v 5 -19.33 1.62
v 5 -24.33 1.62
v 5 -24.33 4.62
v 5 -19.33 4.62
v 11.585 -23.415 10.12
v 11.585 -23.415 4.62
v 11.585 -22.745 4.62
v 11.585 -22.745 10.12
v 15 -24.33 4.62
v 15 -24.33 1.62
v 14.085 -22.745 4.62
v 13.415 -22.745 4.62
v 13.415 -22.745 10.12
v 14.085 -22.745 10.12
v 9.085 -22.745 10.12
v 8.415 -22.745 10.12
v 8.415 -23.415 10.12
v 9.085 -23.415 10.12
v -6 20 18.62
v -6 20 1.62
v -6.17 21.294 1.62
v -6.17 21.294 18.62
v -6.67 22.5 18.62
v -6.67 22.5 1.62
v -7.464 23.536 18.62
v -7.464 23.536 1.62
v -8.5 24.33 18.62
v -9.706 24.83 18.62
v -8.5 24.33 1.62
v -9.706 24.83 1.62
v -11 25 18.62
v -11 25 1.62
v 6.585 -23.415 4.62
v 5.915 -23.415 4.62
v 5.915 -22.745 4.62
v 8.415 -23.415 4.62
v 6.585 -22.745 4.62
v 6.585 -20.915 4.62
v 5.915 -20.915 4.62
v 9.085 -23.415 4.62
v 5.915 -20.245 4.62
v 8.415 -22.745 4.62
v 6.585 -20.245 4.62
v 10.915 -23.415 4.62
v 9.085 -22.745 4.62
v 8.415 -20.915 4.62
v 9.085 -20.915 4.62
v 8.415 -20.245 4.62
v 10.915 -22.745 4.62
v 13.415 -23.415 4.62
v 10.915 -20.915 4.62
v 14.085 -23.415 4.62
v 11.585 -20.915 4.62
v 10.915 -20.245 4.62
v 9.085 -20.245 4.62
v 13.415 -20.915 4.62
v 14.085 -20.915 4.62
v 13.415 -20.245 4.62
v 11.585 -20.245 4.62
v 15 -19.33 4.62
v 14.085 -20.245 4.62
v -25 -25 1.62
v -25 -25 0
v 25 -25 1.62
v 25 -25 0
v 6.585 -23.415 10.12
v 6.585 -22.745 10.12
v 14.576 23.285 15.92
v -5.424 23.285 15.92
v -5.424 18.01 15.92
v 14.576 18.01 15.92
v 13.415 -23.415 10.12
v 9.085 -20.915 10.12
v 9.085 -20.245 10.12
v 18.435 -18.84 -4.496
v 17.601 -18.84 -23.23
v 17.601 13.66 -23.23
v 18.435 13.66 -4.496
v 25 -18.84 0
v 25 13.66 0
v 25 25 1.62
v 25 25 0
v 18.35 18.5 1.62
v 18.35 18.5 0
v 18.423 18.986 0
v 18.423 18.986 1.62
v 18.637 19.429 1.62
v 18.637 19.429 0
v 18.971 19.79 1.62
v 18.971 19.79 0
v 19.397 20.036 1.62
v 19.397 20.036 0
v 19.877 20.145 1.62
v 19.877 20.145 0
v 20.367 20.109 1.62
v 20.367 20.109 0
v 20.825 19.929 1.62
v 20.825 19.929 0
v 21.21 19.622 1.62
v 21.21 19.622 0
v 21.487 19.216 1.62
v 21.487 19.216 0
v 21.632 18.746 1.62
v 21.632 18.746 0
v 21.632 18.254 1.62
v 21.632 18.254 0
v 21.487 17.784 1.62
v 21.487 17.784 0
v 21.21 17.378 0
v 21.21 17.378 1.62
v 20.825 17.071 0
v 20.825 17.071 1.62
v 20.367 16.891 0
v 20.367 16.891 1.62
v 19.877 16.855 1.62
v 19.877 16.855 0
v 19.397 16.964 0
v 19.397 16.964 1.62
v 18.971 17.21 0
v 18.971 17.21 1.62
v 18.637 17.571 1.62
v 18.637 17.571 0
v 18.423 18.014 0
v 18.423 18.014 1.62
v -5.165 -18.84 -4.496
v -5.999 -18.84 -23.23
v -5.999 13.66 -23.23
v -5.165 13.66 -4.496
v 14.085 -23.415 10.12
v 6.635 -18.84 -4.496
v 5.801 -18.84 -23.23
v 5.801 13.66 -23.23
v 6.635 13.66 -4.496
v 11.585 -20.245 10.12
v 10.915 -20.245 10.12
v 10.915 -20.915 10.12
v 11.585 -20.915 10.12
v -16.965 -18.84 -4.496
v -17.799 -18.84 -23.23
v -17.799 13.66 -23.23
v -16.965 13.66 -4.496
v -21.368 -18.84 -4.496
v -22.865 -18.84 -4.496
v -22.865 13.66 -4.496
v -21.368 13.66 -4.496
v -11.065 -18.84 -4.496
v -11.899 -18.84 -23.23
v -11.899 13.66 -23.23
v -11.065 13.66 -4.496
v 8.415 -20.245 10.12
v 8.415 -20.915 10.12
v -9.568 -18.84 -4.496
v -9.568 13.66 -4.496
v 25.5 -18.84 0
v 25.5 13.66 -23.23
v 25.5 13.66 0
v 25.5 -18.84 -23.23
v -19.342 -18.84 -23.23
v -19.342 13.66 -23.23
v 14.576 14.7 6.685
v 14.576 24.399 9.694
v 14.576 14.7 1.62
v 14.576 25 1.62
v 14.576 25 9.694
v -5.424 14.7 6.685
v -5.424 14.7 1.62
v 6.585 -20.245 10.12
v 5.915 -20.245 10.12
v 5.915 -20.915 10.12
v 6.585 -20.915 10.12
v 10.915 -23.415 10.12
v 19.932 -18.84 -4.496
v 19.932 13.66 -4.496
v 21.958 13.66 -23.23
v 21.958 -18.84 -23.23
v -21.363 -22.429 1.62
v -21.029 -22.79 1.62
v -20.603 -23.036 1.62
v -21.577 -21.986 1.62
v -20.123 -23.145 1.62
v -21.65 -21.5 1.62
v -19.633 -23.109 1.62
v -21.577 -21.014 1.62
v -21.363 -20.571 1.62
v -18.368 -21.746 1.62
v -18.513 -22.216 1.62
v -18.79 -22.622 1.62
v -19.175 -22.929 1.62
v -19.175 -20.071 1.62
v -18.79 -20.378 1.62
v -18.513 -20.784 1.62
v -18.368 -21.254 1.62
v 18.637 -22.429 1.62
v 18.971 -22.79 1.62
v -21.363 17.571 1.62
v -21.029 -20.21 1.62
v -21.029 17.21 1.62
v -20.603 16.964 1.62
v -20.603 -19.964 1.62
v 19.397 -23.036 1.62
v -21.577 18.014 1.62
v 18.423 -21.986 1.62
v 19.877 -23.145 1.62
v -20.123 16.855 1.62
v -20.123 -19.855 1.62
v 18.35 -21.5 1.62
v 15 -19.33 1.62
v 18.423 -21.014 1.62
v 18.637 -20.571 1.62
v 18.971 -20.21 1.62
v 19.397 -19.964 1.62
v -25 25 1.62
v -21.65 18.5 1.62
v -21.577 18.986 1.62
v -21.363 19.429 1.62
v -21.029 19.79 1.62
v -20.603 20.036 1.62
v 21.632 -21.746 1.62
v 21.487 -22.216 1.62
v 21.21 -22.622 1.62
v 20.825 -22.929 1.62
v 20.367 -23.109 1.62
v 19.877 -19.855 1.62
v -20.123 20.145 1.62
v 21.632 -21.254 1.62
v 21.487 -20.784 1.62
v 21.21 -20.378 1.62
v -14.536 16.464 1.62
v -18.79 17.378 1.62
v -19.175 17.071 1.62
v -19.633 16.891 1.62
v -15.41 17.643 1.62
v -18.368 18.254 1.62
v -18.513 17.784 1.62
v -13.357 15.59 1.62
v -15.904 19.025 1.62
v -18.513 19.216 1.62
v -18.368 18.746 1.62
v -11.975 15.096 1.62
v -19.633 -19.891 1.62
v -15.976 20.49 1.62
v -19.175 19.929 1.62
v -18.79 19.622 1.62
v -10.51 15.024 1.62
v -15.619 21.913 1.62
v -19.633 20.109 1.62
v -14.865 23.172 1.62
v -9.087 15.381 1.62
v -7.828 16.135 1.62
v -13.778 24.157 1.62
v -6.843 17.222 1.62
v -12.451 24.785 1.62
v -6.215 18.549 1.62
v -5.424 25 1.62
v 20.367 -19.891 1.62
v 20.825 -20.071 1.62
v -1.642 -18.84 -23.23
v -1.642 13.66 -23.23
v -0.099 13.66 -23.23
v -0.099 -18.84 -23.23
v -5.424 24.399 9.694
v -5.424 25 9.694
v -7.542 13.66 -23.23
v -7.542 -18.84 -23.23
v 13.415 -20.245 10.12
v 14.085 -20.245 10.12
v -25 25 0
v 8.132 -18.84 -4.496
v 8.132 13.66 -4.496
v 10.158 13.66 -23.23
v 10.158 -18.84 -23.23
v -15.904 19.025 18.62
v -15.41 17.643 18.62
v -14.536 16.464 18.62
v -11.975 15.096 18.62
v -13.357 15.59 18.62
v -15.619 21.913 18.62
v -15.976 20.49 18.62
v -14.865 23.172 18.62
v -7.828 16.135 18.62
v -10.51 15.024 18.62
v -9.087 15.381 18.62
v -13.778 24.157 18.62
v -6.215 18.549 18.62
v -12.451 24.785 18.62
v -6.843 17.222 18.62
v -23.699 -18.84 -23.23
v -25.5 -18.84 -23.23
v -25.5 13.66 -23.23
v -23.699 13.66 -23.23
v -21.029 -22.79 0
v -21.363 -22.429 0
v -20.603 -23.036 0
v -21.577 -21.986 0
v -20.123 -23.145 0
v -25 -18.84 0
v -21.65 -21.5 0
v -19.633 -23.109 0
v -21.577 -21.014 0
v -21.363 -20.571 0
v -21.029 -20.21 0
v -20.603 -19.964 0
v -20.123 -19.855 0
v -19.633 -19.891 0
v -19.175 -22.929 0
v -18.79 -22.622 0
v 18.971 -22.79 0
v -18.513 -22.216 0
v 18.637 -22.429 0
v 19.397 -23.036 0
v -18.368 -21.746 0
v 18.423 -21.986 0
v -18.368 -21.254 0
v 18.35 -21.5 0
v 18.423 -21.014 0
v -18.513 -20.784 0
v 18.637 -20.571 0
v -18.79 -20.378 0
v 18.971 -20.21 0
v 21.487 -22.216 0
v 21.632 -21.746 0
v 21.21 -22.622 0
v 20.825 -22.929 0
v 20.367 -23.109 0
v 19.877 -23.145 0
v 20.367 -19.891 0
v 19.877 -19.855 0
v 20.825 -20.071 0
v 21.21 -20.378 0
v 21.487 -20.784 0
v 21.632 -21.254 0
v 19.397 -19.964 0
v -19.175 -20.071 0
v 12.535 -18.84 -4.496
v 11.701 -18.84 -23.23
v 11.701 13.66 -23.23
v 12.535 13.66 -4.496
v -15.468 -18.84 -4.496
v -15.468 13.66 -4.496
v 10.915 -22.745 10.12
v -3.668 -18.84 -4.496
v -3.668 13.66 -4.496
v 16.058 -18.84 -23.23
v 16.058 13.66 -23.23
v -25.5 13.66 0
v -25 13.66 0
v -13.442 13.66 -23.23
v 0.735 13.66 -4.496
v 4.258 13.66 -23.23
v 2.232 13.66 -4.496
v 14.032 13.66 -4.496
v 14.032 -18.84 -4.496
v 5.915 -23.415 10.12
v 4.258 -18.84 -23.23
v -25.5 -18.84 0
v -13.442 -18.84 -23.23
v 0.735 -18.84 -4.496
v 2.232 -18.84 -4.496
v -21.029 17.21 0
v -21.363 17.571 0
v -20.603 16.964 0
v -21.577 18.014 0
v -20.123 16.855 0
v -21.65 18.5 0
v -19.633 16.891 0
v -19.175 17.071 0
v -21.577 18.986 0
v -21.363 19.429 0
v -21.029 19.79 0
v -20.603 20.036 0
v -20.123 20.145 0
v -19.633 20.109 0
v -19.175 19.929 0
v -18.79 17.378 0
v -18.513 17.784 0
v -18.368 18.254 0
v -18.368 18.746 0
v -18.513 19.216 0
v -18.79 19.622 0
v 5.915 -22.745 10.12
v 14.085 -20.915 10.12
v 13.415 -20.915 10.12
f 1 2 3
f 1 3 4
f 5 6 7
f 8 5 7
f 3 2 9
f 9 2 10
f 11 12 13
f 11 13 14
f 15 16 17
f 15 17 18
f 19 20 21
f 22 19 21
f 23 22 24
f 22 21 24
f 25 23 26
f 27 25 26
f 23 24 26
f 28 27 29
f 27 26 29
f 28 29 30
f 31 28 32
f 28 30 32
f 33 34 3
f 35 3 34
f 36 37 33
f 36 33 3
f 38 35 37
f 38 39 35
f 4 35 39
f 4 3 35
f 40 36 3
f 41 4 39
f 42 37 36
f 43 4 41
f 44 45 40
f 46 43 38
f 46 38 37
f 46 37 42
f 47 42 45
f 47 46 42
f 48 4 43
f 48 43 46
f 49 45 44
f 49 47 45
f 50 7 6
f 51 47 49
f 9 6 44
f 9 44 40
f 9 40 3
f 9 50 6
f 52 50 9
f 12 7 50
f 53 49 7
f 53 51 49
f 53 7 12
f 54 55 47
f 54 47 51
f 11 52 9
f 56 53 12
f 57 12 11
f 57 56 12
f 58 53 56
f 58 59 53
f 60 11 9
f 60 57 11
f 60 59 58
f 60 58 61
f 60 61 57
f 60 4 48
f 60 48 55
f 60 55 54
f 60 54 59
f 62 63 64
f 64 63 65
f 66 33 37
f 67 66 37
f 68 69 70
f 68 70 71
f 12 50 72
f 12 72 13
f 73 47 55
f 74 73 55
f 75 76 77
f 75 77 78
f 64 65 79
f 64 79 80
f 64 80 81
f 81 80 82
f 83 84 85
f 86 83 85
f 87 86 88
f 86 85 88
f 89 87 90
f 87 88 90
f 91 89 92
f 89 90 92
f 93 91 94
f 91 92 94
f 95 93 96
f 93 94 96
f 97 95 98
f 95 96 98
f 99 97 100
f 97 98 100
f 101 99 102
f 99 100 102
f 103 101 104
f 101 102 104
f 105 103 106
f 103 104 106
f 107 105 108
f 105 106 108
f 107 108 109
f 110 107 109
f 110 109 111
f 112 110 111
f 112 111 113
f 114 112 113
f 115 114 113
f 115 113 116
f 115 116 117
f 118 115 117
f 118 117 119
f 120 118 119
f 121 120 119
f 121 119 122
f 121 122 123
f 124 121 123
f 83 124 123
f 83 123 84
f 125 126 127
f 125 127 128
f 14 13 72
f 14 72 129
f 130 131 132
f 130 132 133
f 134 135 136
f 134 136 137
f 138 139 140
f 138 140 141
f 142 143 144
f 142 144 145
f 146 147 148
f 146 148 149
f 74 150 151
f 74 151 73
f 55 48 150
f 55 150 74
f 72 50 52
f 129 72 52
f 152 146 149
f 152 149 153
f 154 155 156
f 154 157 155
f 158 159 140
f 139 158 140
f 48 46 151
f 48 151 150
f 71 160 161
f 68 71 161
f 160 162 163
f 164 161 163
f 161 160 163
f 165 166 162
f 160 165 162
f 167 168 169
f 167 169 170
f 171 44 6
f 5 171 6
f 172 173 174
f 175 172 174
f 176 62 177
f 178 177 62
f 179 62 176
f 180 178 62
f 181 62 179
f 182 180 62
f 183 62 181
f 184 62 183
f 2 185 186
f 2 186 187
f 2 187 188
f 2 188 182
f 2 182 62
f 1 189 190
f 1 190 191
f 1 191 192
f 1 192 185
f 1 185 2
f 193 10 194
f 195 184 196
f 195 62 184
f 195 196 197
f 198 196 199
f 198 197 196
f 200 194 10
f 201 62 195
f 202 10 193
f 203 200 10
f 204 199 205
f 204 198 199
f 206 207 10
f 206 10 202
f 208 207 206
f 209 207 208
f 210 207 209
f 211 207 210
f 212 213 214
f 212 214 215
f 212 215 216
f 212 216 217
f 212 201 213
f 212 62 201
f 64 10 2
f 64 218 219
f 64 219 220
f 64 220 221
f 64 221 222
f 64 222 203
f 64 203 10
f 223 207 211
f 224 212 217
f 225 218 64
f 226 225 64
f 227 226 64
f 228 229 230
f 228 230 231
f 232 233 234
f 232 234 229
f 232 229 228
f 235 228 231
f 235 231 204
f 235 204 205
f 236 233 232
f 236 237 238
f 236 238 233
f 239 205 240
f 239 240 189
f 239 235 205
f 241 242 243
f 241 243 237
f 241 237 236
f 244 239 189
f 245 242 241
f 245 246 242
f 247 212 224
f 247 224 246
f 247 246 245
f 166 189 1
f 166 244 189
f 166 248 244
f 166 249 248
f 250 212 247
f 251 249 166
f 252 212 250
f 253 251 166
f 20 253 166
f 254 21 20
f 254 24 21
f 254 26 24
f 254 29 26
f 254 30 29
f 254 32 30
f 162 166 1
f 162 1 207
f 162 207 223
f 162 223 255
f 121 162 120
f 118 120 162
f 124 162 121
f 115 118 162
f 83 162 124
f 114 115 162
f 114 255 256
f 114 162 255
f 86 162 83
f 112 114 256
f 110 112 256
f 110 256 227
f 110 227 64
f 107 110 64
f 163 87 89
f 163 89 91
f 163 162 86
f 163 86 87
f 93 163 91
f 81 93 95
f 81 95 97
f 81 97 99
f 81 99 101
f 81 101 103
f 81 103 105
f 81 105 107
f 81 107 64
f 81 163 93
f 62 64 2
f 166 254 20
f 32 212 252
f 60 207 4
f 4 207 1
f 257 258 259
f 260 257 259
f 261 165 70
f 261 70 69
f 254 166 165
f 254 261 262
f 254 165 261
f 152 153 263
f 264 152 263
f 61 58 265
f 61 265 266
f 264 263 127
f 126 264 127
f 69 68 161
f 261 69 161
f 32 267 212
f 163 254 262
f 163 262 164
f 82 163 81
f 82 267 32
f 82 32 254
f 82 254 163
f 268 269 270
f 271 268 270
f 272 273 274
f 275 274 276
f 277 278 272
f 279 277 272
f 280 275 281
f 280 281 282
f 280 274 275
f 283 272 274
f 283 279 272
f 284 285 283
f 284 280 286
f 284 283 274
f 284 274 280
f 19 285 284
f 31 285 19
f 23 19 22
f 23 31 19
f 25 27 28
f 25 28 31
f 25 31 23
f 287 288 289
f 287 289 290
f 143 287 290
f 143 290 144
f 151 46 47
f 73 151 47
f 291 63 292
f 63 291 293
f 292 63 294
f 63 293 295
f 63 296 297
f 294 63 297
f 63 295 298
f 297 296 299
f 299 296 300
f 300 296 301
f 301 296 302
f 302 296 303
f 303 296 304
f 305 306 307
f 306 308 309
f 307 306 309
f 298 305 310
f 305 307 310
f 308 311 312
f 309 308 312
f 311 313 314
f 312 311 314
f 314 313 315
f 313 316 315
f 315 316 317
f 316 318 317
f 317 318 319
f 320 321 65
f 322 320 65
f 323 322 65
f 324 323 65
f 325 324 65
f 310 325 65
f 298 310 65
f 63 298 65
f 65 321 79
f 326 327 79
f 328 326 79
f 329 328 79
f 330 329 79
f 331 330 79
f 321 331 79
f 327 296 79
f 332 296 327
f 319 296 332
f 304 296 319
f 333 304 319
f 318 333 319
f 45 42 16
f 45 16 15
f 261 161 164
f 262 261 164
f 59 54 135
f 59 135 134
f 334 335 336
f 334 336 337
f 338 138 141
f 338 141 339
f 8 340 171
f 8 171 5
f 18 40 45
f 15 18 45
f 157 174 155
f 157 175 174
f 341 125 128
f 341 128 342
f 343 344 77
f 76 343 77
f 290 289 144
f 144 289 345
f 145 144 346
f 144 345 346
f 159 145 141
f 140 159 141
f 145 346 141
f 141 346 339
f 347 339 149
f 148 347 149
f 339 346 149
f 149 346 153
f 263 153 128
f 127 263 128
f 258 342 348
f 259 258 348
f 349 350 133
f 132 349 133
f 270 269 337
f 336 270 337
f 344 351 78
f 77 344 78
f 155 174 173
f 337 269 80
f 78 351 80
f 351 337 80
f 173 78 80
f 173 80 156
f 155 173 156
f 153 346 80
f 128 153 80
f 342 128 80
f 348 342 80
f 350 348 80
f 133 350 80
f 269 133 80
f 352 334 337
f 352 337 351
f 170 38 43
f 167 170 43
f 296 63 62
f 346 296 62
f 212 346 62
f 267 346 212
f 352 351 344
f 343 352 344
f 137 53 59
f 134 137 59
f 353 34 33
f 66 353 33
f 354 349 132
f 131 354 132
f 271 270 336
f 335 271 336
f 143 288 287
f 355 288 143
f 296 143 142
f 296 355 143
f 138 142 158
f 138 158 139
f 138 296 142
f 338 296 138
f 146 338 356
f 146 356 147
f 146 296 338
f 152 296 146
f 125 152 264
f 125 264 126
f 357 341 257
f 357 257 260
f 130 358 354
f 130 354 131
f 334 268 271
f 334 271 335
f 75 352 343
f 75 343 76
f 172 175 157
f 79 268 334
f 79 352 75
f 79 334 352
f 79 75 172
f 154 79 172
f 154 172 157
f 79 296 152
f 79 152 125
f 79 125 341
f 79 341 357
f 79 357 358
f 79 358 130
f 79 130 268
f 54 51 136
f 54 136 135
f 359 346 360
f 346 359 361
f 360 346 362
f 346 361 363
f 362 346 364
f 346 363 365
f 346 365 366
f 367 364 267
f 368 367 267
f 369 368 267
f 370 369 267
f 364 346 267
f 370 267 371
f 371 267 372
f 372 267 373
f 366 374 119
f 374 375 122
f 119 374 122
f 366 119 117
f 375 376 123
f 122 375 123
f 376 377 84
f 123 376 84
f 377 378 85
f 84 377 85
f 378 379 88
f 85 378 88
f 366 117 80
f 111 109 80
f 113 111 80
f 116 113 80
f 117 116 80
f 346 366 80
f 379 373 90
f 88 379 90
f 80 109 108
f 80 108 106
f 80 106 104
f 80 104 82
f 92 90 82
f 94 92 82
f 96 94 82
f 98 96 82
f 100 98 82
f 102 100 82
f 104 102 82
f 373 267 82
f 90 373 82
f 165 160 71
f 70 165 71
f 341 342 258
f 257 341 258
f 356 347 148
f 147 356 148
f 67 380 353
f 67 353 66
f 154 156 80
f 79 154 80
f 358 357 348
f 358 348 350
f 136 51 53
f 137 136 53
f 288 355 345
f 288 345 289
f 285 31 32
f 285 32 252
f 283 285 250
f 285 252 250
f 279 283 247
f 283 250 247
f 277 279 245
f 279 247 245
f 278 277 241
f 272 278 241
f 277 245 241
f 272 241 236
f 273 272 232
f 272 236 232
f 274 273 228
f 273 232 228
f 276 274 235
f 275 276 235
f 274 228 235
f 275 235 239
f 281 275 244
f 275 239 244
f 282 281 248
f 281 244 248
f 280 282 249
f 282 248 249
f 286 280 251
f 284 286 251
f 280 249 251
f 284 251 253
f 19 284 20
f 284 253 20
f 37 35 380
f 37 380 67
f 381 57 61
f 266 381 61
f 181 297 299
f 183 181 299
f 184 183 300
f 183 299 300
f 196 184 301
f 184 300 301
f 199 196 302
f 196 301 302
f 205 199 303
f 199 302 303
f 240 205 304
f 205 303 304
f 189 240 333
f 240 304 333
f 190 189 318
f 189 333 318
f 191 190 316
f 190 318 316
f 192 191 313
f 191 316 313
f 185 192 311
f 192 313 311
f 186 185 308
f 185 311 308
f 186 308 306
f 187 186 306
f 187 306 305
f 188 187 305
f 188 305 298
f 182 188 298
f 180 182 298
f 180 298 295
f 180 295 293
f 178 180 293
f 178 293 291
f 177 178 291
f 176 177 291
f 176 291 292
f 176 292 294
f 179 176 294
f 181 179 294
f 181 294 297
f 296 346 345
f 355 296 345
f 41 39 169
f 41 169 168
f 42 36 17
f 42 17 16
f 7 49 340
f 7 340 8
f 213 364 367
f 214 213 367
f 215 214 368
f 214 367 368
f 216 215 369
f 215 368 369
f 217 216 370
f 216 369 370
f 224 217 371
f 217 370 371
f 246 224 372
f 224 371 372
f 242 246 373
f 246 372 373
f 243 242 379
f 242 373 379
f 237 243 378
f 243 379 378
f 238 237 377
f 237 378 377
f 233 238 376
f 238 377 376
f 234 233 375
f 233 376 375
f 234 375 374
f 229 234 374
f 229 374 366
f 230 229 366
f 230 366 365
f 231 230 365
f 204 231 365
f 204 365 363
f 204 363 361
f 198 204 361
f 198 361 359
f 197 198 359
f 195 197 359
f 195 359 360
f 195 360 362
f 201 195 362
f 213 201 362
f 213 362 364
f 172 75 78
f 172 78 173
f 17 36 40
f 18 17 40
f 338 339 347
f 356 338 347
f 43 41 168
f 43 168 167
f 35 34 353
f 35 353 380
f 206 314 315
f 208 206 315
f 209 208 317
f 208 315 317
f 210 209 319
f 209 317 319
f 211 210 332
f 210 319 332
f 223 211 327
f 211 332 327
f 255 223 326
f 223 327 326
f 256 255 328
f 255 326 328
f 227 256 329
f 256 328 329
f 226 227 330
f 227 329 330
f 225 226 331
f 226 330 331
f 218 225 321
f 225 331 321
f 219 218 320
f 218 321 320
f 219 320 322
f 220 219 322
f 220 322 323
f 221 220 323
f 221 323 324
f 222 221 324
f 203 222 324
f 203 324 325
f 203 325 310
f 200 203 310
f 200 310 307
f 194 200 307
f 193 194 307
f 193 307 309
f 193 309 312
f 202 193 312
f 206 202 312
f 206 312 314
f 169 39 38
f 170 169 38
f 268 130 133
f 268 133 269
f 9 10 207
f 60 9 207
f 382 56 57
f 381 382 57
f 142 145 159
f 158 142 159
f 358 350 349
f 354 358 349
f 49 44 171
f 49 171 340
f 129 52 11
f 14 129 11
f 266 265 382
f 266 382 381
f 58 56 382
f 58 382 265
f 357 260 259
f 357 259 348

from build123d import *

# Parameters (mm, degrees)
F0_W          = 50
F0_H          = 50
F1_DEPTH      = 1.62
F3_DEPTH      = 17
F2_W          = 20
F2_H          = 10.3
F4_DEPTH      = 14.3
F2_W_2        = 2.5
F2_H_2        = 5
F2_W_3        = 0.67
F2_H_3        = 0.67
F5_DEPTH      = 3
F6_DEPTH      = 8.5
F7_D          = 3.3
F9_DEPTH      = 18.84
F9_DEPTH_BACK = 13.66
F11_DEPTH     = 20


with BuildPart() as f1:
    # F0 (on Top) → F1 (new body)
    with BuildSketch(Plane.XY):
        Rectangle(F0_W, F0_H)
    extrude(amount=F1_DEPTH)

    # F2 (on face) → F3 (join)
    with BuildSketch(Plane.XY.offset(1.62)):
        with BuildLine():
            ThreePointArc((-6, 20), (-7.464466, 23.535534), (-11, 25))
            ThreePointArc((-11, 25), (-14.535534, 16.464466), (-6, 20))
        make_face()
    extrude(amount=F3_DEPTH)

    # F2 (on face) → F4 (join)
    with BuildSketch(Plane.XY.offset(1.62)):
        with Locations((4.576447, 19.85)):
            Rectangle(F2_W, F2_H)
    extrude(amount=F4_DEPTH)

    # F2 (on face) → F5 (join)
    with BuildSketch(Plane.XY.offset(1.62)):
        with Locations((13.75, -21.83)):
            Rectangle(F2_W_2, F2_H_2)
        with Locations((13.75, -23.08)):
            Rectangle(F2_W_3, F2_H_3, mode=Mode.SUBTRACT)
        with Locations((13.75, -20.58)):
            Rectangle(F2_W_3, F2_H_3, mode=Mode.SUBTRACT)
        with Locations((11.25, -21.83)):
            Rectangle(F2_W_2, F2_H_2)
        with Locations((11.25, -23.08)):
            Rectangle(F2_W_3, F2_H_3, mode=Mode.SUBTRACT)
        with Locations((11.25, -20.58)):
            Rectangle(F2_W_3, F2_H_3, mode=Mode.SUBTRACT)
        with Locations((8.75, -21.83)):
            Rectangle(F2_W_2, F2_H_2)
        with Locations((8.75, -23.08)):
            Rectangle(F2_W_3, F2_H_3, mode=Mode.SUBTRACT)
        with Locations((8.75, -20.58)):
            Rectangle(F2_W_3, F2_H_3, mode=Mode.SUBTRACT)
        with Locations((6.25, -21.83)):
            Rectangle(F2_W_2, F2_H_2)
        with Locations((6.25, -23.08)):
            Rectangle(F2_W_3, F2_H_3, mode=Mode.SUBTRACT)
        with Locations((6.25, -20.58)):
            Rectangle(F2_W_3, F2_H_3, mode=Mode.SUBTRACT)
    extrude(amount=F5_DEPTH)

    # F2 (on face) → F6 (join)
    with BuildSketch(Plane.XY.offset(1.62)):
        with Locations((6.25, -20.58)):
            Rectangle(F2_W_3, F2_H_3)
        with Locations((6.25, -23.08)):
            Rectangle(F2_W_3, F2_H_3)
        with Locations((8.75, -23.08)):
            Rectangle(F2_W_3, F2_H_3)
        with Locations((8.75, -20.58)):
            Rectangle(F2_W_3, F2_H_3)
        with Locations((11.25, -20.58)):
            Rectangle(F2_W_3, F2_H_3)
        with Locations((11.25, -23.08)):
            Rectangle(F2_W_3, F2_H_3)
        with Locations((13.75, -23.08)):
            Rectangle(F2_W_3, F2_H_3)
        with Locations((13.75, -20.58)):
            Rectangle(F2_W_3, F2_H_3)
    extrude(amount=F6_DEPTH)

    # F7 (through all)
    with Locations(Plane.XY.offset(1.62)):
        with Locations((-20, 18.5), (-20, -21.5), (20, -21.5), (20, 18.5)):
            Hole(F7_D / 2)

    # F8 (on Front) → F9 (join, two sides)
    with BuildSketch(Plane.XZ) as f9_sk:
        Polygon((25.5, -23.23), (25.5, 0), (-25.5, 0), (-25.5, -23.23), (-23.699168, -23.23), (-22.864854, -4.496027), (-21.367718, -4.496027), (-19.342193, -23.23), (-17.799168, -23.23), (-16.964854, -4.496027), (-15.467718, -4.496027), (-13.442193, -23.23), (-11.899168, -23.23), (-11.064854, -4.496027), (-9.567718, -4.496027), (-7.542193, -23.23), (-5.999168, -23.23), (-5.164854, -4.496027), (-3.667718, -4.496027), (-1.642193, -23.23), (-0.099168, -23.23), (0.735146, -4.496027), (2.232282, -4.496027), (4.257807, -23.23), (5.800832, -23.23), (6.635146, -4.496027), (8.132282, -4.496027), (10.157807, -23.23), (11.700832, -23.23), (12.535146, -4.496027), (14.032282, -4.496027), (16.057807, -23.23), (17.600832, -23.23), (18.435146, -4.496027), (19.932282, -4.496027), (21.957807, -23.23), align=None)
    extrude(amount=F9_DEPTH)
    extrude(f9_sk.sketch, amount=-F9_DEPTH_BACK)

    # F10 (on face) → F11 (cut)
    with BuildSketch(Plane.YZ.offset(14.576447)):
        Polygon((14.7, 15.92), (14.7, 6.684894), (18.009929, 15.92), align=None)
        Polygon((25, 15.92), (23.284927, 15.92), (24.399363, 9.693871), (25, 9.693871), align=None)
    extrude(amount=-F11_DEPTH, mode=Mode.SUBTRACT)


solid = f1.part
